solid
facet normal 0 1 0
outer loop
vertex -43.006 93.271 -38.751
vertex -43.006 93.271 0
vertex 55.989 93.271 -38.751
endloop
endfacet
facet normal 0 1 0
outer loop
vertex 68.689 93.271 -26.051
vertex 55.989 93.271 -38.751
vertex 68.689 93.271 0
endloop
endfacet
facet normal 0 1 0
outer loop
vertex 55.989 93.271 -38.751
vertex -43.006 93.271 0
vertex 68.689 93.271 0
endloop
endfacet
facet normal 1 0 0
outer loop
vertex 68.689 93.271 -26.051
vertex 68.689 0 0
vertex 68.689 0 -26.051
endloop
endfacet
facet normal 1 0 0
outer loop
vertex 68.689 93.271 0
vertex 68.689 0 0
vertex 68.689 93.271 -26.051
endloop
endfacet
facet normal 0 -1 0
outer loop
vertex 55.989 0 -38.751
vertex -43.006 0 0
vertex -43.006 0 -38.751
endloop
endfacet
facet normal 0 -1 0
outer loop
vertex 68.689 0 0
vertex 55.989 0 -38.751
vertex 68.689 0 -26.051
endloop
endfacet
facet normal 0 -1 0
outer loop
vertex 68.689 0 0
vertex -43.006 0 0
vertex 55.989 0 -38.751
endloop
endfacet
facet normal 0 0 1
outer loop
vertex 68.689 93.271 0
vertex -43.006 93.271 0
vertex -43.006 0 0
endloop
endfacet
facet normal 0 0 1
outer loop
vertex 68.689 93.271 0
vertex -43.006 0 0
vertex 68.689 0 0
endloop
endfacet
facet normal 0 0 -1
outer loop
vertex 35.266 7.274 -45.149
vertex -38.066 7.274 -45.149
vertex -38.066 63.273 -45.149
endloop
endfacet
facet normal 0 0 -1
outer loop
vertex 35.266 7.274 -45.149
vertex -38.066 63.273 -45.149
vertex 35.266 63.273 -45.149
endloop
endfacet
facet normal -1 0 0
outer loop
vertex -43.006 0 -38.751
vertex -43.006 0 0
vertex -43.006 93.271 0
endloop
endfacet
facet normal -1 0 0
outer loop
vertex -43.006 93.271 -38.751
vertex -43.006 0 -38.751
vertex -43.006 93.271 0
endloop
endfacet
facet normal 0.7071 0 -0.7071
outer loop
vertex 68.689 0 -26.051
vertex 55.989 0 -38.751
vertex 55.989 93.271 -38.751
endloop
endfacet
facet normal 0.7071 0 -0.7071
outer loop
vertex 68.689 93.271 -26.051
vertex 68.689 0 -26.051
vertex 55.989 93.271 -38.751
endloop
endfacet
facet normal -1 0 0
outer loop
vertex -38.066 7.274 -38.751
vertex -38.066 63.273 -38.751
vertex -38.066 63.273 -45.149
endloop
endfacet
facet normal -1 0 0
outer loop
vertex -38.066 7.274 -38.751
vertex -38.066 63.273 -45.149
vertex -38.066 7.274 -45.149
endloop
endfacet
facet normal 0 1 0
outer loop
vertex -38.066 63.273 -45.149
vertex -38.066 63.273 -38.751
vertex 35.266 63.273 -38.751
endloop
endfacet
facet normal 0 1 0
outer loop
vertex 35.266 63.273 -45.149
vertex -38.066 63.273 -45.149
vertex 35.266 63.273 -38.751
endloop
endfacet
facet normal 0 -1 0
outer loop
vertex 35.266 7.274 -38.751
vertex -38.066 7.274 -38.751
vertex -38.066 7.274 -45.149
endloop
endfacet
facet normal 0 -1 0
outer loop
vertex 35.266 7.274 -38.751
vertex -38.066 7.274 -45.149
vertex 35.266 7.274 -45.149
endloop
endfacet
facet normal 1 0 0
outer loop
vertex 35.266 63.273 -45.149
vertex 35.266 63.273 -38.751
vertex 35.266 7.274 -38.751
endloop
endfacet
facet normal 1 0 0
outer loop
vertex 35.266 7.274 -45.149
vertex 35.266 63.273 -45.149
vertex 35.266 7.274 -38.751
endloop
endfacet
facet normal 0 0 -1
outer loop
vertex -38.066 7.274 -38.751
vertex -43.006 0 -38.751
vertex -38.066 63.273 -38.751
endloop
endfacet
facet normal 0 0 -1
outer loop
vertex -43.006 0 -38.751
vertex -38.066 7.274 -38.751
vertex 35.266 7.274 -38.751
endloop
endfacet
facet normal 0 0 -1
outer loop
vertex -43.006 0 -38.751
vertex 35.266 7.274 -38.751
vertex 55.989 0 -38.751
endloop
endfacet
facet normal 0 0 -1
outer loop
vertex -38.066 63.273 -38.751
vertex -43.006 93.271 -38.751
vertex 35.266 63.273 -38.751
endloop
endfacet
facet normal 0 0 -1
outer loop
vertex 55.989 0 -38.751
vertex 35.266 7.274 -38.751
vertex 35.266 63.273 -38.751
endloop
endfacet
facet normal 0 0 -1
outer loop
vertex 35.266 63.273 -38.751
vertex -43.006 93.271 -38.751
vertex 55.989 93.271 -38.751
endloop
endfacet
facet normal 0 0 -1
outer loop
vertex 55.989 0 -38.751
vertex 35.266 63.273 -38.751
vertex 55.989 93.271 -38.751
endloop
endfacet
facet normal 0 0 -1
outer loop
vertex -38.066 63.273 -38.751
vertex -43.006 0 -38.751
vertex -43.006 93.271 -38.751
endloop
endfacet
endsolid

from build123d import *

# Parameters (mm, degrees)
F0_W     = 111.695483
F0_H     = 93.271062
F1_DEPTH = 38.75114
F2_SIZE  = 12.7
F3_W     = 73.332176
F3_H     = 55.99878
F4_DEPTH = 6.398048


with BuildPart() as f1:
    # F0 (on Top) → F1 (new body)
    with BuildSketch(Plane.XY):
        with Locations((12.841567, 46.635531)):
            Rectangle(F0_W, F0_H)
    extrude(amount=-F1_DEPTH)

    # F2
    f2_edges = [f1.edges().sort_by_distance(p)[0] for p in [
        (68.689309, 46.635531, -38.75114),
    ]]
    chamfer(f2_edges, length=F2_SIZE)

    # F3 (on face) → F4 (join)
    with BuildSketch(Plane(origin=(0, 0, -38.75114), x_dir=(1, 0, 0), z_dir=(0, 0, -1))):
        with Locations((-1.400314, -35.273772)):
            Rectangle(F3_W, F3_H)
    extrude(amount=F4_DEPTH)


solid = f1.part
